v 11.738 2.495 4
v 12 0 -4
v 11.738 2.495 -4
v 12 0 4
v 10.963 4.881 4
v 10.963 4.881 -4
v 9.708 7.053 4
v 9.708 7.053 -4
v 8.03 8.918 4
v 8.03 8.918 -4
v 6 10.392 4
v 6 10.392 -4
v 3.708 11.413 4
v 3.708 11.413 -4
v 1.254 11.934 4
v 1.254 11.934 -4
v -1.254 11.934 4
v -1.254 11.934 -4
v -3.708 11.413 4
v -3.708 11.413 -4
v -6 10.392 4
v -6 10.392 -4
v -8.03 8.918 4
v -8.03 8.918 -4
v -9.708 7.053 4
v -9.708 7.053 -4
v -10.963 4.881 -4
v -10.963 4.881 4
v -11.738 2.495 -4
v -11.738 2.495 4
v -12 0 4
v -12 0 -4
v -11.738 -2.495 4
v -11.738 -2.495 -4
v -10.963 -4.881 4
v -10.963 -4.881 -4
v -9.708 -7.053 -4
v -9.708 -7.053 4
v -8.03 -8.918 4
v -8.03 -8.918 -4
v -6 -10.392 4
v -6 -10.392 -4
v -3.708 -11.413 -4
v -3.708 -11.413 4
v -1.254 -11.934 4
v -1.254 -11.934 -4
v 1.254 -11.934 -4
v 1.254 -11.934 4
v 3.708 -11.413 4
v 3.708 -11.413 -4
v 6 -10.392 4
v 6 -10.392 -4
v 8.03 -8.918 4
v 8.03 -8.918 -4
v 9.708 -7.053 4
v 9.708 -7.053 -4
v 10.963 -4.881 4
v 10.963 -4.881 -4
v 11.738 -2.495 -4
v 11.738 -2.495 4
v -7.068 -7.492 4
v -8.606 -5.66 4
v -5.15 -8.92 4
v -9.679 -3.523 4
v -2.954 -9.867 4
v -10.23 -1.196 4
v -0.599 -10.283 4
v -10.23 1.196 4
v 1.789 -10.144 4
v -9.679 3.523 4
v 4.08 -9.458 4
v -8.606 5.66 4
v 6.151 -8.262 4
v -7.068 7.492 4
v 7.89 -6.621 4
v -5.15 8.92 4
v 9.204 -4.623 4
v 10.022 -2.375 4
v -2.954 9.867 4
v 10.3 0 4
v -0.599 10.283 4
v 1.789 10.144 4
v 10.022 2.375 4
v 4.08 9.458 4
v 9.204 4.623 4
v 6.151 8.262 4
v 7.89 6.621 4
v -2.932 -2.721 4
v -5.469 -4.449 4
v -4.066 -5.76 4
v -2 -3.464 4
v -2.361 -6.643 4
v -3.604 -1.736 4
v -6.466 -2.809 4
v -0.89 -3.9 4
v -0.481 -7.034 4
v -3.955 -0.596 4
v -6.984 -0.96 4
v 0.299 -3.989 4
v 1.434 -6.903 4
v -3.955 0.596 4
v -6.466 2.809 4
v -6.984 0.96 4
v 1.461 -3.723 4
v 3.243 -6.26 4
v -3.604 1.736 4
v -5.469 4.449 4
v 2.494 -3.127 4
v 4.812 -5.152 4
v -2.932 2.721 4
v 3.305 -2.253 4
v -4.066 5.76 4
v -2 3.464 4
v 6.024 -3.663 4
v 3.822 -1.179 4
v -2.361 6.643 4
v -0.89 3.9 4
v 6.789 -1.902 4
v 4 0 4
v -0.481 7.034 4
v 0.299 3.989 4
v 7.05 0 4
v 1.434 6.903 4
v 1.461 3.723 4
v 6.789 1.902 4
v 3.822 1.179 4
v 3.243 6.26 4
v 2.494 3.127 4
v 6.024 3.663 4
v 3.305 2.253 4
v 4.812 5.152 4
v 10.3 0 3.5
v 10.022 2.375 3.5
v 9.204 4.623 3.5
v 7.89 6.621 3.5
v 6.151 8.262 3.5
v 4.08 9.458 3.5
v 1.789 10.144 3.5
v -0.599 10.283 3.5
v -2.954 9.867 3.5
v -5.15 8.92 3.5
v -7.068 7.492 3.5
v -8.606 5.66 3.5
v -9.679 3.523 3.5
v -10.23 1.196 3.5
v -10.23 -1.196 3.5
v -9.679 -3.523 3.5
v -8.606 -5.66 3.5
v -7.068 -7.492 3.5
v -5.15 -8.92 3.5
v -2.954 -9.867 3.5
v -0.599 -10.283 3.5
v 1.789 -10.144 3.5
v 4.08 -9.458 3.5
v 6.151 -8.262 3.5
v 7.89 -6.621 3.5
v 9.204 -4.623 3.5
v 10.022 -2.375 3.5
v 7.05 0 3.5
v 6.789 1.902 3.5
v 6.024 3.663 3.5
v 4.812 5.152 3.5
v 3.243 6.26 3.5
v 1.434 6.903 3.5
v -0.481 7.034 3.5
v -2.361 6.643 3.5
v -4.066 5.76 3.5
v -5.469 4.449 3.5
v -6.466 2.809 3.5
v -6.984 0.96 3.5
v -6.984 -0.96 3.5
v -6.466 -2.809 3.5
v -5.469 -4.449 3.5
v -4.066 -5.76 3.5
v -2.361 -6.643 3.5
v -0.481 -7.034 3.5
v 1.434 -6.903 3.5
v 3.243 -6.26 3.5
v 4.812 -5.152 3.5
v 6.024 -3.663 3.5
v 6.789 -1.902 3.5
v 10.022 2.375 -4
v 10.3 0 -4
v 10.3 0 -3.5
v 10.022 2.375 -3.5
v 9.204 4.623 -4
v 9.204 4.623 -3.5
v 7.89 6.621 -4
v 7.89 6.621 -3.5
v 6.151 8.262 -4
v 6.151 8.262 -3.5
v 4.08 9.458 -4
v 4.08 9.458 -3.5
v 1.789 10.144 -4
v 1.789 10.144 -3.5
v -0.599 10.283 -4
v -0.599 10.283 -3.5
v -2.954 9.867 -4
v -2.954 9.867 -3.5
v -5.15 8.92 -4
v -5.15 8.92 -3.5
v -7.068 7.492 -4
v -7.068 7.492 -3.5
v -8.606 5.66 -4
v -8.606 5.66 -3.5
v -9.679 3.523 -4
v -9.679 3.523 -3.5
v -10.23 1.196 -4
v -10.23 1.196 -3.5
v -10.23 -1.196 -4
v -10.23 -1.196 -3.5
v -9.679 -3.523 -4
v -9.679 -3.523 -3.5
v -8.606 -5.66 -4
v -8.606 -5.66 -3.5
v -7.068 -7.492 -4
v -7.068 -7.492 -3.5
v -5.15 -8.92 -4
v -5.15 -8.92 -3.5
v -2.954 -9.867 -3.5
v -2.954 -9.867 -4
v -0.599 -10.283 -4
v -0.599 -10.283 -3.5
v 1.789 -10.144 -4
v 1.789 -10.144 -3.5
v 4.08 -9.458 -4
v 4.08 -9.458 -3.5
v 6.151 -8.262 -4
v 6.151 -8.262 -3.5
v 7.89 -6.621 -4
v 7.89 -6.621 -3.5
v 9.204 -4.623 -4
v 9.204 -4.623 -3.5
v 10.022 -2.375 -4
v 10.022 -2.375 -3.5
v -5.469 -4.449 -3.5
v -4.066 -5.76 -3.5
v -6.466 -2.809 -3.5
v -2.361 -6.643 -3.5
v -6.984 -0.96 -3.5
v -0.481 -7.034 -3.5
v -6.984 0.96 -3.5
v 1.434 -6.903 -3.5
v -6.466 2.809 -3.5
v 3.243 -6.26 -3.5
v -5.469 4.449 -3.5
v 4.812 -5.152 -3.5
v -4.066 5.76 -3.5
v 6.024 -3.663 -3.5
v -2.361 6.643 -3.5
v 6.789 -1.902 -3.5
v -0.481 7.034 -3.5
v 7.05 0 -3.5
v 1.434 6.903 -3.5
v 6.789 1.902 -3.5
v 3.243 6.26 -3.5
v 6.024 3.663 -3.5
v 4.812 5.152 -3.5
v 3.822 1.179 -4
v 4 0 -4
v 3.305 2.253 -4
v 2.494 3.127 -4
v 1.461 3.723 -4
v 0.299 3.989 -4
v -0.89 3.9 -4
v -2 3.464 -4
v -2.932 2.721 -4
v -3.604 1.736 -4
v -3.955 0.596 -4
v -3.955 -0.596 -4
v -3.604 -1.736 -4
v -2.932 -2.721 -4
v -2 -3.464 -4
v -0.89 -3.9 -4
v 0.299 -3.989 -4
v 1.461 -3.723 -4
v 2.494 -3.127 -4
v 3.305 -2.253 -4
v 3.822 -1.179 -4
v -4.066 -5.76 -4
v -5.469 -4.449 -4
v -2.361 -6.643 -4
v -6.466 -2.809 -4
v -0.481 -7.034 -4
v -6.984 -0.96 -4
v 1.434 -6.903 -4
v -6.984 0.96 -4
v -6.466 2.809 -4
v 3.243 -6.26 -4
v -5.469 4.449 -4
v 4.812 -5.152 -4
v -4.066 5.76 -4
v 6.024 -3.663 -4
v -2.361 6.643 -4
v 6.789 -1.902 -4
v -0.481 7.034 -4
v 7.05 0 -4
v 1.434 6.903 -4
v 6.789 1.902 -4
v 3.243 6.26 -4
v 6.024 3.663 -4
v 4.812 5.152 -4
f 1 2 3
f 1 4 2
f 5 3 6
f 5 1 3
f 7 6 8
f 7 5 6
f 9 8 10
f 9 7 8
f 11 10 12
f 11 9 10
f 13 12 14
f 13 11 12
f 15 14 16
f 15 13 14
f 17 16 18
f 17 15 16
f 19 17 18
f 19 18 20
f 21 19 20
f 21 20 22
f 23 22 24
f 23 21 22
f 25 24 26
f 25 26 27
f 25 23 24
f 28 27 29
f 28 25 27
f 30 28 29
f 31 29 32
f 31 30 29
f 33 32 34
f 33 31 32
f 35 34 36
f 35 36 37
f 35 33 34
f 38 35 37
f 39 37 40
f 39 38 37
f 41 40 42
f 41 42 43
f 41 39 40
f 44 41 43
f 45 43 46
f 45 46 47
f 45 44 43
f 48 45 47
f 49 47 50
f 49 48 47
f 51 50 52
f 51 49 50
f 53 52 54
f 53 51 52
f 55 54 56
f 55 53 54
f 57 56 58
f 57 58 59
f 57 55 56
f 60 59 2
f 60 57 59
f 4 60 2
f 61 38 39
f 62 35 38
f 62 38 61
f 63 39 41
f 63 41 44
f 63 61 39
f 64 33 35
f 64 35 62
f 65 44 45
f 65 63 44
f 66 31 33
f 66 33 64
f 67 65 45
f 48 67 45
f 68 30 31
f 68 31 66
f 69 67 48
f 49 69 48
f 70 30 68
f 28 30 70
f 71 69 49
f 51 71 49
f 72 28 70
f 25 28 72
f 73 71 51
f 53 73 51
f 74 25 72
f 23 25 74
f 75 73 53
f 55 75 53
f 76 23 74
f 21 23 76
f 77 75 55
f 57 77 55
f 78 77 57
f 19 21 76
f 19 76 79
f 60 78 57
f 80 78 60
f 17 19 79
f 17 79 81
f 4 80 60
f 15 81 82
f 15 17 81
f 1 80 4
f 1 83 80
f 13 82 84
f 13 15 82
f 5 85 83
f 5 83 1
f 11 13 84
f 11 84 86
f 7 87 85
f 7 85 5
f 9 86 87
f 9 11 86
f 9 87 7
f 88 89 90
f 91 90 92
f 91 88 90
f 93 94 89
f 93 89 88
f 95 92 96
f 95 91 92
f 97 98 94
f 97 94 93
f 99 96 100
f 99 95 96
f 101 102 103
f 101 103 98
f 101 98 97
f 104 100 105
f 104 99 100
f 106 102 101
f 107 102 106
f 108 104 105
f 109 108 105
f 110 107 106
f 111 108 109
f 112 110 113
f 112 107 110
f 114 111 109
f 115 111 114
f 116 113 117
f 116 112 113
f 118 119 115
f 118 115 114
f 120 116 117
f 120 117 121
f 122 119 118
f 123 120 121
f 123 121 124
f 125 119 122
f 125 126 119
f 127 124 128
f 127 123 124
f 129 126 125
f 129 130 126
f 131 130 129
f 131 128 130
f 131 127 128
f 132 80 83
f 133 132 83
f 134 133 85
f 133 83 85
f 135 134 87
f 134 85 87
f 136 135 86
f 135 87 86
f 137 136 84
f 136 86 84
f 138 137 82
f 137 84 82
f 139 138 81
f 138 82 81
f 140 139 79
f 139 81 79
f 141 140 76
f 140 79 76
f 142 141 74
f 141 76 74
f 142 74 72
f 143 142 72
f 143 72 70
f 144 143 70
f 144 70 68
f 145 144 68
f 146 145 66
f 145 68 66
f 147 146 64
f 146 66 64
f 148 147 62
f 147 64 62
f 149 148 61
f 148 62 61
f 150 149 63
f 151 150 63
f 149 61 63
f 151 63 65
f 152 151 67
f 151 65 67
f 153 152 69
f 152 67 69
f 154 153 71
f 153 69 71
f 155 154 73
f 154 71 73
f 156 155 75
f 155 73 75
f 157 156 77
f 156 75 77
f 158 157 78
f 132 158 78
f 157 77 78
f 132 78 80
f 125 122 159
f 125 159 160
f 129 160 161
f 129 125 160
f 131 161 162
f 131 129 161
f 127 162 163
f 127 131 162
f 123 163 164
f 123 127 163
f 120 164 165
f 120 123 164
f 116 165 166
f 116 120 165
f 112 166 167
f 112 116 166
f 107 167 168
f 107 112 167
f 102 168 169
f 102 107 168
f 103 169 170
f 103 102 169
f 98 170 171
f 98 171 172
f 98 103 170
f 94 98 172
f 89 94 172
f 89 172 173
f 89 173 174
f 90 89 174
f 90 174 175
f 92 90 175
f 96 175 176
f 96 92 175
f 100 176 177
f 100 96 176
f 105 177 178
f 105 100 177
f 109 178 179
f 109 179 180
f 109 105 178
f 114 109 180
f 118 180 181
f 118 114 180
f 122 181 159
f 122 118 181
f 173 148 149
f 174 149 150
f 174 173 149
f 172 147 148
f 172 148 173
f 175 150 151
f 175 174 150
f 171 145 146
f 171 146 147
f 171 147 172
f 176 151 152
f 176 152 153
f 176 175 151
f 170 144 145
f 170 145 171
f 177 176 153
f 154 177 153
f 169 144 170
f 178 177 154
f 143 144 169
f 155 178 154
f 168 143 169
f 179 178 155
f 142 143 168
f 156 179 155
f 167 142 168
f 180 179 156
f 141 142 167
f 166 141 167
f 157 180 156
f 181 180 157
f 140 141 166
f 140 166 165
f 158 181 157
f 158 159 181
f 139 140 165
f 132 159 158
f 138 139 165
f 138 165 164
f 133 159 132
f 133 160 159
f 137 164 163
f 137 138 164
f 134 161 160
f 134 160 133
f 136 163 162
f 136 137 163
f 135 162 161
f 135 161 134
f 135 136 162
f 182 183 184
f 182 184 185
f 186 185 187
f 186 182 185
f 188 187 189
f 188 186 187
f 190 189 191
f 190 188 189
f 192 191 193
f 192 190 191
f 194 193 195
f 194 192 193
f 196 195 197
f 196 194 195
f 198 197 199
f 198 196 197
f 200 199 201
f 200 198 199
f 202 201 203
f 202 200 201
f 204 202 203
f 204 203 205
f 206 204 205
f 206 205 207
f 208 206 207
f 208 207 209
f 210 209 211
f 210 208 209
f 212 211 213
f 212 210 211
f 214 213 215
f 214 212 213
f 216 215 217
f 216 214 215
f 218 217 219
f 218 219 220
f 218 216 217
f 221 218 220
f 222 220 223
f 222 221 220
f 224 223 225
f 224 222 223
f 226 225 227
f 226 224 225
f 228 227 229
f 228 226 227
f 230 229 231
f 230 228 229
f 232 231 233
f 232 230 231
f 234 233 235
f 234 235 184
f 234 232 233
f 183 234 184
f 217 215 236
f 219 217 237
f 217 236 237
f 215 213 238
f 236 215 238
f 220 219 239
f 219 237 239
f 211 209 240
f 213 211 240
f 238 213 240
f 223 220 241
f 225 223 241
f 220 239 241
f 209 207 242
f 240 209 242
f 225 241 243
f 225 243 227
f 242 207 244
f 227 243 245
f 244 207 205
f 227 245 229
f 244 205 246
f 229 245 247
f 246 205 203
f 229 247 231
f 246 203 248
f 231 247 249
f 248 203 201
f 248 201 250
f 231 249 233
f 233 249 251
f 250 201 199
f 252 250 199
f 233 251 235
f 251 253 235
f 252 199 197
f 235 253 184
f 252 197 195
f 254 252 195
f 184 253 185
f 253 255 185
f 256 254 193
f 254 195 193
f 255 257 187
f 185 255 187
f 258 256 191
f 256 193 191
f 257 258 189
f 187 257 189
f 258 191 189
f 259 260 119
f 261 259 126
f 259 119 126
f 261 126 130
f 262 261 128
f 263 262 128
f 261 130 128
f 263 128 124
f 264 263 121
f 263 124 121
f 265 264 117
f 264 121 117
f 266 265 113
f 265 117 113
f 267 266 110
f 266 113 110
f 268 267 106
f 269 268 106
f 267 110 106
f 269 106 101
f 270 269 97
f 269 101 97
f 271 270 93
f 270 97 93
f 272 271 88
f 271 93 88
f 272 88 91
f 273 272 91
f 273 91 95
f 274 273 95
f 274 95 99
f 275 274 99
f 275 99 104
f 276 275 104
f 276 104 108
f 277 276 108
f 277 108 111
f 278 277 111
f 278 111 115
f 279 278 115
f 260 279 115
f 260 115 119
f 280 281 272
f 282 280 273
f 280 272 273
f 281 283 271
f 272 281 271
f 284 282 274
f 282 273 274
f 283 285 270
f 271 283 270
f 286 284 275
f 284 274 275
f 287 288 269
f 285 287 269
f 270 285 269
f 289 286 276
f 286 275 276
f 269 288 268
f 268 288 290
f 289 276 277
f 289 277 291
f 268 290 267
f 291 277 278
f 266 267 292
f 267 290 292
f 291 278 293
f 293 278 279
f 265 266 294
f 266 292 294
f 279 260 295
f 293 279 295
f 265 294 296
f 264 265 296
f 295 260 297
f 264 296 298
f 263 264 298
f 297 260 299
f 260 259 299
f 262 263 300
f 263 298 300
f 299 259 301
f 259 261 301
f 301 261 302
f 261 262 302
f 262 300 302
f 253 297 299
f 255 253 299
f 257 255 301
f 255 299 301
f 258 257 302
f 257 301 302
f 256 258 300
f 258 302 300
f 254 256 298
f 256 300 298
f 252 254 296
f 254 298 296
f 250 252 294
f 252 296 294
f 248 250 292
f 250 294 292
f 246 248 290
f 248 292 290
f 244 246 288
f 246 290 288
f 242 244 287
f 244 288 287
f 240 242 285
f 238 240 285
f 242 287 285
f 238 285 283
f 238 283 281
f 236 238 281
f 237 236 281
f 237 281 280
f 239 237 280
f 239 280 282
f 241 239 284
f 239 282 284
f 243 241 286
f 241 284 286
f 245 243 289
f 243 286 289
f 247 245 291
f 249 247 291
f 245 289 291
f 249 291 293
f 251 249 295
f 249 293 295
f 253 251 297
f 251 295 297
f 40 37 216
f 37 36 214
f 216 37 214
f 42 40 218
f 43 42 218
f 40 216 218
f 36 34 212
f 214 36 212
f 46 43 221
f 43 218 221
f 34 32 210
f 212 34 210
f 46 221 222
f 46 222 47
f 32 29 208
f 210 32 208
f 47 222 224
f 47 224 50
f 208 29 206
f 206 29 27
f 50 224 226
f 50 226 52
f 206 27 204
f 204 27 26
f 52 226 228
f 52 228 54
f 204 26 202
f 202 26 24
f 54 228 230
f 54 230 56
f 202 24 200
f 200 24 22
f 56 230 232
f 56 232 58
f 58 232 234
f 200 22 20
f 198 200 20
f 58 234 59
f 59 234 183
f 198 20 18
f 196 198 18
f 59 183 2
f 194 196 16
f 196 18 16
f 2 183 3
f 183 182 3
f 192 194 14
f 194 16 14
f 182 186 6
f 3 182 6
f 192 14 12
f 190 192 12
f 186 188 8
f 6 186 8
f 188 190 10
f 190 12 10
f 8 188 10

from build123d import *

# Parameters (mm, degrees)
SKETCH_1_R          = 12
EXTRUDE_1_DEPTH     = 4
SKETCH_2_R          = 4
CUT_EXTRUDE_1_DEPTH = 9
SKETCH_3_R          = 10.3
SKETCH_3_R_2        = 7.05
CUT_EXTRUDE_2_DEPTH = 0.5


with BuildPart() as part:
    # 草圖1 → 填料-伸長1 (new body, symmetric)
    with BuildSketch(Plane.XY):
        Circle(SKETCH_1_R)
    extrude(amount=EXTRUDE_1_DEPTH, both=True)

    # 草圖2 → 除料-伸長1 (cut, through all)
    with BuildSketch(Plane.XY.offset(4)):
        Circle(SKETCH_2_R)
    extrude(amount=-CUT_EXTRUDE_1_DEPTH, mode=Mode.SUBTRACT)

    # 草圖3 → 除料-伸長2 (cut)
    with BuildSketch(Plane.XY.offset(4)):
        Circle(SKETCH_3_R)
        Circle(SKETCH_3_R_2, mode=Mode.SUBTRACT)
    cut_extrude_2 = extrude(amount=-CUT_EXTRUDE_2_DEPTH, mode=Mode.SUBTRACT)

    # 鏡射1: 除料-伸長2 across plane
    add(cut_extrude_2.mirror(Plane.XY), mode=Mode.SUBTRACT)


solid = part.part
